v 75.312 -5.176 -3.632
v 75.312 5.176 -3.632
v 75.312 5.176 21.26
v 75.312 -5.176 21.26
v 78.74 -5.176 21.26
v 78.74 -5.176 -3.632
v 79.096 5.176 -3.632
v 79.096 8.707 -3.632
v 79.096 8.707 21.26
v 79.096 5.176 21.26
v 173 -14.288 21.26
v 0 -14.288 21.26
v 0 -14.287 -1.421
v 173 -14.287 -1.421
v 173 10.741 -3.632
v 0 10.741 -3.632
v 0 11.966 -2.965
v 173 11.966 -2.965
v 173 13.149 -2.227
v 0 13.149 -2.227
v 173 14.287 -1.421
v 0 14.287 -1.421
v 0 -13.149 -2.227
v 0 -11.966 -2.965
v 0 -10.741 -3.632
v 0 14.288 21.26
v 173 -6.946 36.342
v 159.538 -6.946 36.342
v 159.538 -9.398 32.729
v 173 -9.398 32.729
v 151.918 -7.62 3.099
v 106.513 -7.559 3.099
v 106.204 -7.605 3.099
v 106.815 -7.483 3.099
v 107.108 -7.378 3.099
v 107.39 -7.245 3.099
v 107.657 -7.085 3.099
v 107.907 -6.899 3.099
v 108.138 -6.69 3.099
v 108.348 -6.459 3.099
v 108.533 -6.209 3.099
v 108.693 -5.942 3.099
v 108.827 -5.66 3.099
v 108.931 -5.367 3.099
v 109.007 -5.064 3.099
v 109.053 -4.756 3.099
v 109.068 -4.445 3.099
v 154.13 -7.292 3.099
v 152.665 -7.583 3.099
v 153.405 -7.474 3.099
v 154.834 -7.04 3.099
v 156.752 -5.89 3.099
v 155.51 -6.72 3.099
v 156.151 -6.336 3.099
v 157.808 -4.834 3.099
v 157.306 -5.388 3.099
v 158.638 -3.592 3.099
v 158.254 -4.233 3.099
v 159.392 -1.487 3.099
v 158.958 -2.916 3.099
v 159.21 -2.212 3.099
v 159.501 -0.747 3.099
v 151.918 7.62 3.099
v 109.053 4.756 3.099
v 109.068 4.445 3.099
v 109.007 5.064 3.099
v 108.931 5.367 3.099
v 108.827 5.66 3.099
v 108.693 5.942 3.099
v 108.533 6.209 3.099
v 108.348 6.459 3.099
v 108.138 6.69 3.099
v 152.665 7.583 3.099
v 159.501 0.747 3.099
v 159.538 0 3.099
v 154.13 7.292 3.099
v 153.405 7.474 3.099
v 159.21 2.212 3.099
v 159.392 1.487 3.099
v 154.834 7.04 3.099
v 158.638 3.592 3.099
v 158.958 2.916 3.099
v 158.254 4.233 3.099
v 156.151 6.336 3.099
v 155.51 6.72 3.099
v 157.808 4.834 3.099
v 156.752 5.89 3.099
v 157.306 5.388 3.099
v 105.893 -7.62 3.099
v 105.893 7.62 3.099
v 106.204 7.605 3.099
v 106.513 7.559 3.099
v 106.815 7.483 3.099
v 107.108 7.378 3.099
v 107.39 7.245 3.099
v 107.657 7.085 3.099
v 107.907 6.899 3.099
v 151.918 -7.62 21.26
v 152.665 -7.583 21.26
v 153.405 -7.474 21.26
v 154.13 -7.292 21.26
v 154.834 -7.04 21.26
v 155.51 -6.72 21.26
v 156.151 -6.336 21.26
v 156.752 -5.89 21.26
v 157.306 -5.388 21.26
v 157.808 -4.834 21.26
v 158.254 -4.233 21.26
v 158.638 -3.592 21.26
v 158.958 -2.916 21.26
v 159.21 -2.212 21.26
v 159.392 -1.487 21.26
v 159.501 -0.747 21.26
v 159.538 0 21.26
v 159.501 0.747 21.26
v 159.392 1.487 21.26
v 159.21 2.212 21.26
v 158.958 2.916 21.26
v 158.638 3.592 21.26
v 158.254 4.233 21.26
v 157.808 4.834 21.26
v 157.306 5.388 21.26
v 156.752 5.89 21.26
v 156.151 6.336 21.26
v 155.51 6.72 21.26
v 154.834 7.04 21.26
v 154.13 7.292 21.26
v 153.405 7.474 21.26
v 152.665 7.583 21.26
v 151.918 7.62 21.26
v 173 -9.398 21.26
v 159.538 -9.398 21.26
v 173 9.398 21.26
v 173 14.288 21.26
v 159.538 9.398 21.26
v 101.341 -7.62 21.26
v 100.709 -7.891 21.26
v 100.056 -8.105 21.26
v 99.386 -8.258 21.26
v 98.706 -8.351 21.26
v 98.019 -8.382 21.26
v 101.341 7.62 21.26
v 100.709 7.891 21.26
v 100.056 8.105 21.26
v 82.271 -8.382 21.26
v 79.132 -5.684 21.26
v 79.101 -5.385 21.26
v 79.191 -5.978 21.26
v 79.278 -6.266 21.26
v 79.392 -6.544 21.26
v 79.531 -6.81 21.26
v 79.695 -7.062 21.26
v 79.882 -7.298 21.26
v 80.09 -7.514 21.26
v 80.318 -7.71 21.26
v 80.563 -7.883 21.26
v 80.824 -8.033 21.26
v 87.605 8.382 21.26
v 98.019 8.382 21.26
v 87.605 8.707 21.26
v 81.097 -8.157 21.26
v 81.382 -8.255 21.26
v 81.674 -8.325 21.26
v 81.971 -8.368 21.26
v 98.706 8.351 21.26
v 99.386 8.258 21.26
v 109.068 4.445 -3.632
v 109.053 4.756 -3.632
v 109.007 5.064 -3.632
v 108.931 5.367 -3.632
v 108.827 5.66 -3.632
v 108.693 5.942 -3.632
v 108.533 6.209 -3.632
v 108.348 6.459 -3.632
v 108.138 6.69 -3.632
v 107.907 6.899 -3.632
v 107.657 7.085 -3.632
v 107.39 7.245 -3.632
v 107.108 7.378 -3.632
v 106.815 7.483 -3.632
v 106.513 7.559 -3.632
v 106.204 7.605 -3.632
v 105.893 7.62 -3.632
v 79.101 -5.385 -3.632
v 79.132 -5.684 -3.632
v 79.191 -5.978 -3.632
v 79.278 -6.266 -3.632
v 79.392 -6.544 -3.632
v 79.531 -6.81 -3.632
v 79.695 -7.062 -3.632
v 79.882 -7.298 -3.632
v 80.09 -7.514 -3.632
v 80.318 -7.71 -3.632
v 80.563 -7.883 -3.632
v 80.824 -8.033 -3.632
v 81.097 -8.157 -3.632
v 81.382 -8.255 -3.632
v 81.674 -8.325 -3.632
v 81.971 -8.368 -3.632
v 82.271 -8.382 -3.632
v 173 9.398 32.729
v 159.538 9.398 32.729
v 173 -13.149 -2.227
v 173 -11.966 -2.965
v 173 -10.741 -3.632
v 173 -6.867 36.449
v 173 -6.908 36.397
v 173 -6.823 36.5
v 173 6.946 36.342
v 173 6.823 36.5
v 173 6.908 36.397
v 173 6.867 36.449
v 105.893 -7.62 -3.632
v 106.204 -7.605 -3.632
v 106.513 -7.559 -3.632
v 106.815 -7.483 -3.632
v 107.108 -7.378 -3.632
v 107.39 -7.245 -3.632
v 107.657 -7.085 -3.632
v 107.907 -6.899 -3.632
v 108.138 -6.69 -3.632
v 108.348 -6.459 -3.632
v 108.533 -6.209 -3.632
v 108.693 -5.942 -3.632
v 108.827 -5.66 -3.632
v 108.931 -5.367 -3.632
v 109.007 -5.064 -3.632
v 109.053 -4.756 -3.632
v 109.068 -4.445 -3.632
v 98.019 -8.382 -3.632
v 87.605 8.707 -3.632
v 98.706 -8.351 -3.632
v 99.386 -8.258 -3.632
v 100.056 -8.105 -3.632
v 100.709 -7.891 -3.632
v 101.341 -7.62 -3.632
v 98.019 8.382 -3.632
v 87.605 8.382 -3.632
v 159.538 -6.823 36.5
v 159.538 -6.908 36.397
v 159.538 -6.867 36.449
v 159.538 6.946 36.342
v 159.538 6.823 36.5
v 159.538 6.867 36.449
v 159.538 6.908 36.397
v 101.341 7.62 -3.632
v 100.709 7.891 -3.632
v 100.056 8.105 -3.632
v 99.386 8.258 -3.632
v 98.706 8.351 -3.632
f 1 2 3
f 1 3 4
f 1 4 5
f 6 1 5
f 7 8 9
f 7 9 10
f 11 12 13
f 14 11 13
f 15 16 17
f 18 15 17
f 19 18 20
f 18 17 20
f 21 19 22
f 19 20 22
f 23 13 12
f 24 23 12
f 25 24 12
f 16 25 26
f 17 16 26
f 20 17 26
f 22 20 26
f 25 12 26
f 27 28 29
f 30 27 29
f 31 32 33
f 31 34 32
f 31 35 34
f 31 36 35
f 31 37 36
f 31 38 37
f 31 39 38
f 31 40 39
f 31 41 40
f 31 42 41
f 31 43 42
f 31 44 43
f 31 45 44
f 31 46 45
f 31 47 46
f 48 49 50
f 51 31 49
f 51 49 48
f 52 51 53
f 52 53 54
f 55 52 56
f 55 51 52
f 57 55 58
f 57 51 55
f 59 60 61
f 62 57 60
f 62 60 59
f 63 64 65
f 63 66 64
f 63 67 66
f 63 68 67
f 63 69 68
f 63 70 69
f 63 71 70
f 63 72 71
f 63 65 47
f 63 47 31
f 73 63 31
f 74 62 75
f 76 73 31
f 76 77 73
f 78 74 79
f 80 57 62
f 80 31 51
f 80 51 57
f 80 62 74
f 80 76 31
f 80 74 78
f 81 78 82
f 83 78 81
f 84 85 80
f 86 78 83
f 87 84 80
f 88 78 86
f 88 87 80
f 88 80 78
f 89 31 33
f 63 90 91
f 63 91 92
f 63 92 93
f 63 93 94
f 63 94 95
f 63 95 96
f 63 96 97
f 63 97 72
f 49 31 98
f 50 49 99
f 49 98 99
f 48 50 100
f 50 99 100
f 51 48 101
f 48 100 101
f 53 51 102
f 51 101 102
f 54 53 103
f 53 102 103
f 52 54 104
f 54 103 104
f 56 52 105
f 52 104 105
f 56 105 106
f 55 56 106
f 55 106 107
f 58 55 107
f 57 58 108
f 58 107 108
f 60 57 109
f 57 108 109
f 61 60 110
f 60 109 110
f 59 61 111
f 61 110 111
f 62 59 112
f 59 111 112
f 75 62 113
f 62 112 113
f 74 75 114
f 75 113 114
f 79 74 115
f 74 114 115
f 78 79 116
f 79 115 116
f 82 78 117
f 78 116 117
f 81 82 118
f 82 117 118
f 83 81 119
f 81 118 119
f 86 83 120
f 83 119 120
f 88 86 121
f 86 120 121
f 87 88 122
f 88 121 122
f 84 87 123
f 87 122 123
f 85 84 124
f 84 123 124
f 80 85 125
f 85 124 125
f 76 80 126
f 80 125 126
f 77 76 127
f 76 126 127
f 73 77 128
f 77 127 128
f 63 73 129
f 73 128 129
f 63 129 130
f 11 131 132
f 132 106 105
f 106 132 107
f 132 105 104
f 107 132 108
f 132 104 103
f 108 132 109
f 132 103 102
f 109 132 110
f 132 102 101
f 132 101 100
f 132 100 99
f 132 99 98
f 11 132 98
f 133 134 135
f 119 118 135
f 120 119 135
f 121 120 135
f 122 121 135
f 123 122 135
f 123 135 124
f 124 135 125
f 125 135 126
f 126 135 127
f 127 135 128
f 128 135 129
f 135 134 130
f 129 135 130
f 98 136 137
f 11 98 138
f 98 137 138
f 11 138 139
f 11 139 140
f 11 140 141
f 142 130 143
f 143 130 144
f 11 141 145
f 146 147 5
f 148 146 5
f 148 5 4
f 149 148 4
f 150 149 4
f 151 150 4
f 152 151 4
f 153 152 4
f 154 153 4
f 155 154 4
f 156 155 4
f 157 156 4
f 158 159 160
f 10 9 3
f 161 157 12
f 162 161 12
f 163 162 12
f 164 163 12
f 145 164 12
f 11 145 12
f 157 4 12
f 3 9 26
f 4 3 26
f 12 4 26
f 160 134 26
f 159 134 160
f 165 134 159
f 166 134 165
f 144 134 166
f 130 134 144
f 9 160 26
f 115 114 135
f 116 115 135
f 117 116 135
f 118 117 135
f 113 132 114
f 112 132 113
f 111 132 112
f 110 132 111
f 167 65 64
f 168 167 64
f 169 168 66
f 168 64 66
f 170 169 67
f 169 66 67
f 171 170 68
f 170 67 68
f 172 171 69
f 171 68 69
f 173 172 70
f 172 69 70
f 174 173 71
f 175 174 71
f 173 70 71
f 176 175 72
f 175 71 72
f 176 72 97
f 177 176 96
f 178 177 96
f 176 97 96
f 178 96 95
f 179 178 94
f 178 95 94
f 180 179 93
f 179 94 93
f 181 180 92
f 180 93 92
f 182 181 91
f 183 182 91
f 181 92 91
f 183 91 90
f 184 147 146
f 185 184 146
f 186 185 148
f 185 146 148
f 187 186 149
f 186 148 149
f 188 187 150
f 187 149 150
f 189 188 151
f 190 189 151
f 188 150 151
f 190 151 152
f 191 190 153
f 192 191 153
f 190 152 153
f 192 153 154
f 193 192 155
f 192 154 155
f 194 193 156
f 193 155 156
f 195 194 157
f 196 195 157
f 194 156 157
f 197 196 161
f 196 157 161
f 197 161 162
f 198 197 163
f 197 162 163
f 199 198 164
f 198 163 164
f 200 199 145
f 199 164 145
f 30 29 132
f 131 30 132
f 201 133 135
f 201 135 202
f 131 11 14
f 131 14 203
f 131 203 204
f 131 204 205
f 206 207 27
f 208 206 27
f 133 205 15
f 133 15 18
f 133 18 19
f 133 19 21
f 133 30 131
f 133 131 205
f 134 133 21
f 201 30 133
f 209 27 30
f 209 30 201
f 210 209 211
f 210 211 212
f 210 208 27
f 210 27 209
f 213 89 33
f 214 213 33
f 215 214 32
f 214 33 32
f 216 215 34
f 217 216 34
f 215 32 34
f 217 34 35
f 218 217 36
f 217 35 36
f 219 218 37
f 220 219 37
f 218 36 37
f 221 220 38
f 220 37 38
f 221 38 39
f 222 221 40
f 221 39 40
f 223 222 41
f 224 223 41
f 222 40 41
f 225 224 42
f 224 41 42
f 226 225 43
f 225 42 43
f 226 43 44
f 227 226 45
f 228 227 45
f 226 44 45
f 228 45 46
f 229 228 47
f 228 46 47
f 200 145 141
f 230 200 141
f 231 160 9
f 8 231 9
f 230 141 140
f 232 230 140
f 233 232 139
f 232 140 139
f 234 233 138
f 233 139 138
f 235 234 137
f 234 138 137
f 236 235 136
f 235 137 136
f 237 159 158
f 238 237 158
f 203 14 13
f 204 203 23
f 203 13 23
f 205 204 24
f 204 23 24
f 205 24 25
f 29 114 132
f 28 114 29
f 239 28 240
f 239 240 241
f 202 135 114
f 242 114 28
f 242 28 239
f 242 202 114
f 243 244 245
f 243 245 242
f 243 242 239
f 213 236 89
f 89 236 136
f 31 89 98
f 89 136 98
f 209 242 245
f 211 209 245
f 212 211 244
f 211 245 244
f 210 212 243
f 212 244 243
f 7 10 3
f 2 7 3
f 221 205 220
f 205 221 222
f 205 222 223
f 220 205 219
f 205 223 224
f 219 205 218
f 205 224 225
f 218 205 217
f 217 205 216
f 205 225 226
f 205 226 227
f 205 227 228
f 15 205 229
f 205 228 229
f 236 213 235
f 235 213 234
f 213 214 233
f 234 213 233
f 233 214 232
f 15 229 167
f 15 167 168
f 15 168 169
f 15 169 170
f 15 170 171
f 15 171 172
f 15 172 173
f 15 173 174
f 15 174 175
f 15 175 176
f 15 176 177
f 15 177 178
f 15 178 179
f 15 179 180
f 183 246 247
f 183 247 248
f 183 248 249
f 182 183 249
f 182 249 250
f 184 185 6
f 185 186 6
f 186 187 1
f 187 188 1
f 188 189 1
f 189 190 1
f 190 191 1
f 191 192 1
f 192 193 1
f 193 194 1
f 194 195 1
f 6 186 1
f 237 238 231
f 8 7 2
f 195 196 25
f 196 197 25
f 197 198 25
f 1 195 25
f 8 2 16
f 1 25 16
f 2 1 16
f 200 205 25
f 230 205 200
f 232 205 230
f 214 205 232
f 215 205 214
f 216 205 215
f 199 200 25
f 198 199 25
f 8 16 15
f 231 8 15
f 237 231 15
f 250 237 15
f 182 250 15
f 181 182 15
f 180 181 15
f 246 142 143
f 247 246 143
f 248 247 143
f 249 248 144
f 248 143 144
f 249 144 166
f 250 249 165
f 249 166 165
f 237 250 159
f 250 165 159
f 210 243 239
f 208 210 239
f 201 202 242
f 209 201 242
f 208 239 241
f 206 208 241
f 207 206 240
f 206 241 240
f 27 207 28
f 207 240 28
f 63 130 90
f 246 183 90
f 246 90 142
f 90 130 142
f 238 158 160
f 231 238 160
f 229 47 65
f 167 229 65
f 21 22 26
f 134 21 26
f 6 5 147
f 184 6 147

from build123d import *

# Parameters (mm, degrees)
F1_DEPTH  = 173
F3_DEPTH  = 173.001
F5_DEPTH  = 173.001
F6_W      = 159.538
F6_H      = 15.24
F7_DEPTH  = 23.6865
F9_DEPTH  = 18.161
F11_DEPTH = 24.893
F13_DEPTH = 24.893


with BuildPart() as f1:
    # F0 (on Right) → F1 (new body)
    with BuildSketch(Plane.YZ):
        with BuildLine():
            ThreePointArc((-16, 0), (0, -6.2), (16, 0))
            Line((16, 0), (16, 22.539117))
            ThreePointArc((16, 22.539117), (15.933845, 22.979673), (15.741214, 23.381369))
            Line((15.741214, 23.381369), (6.946329, 36.342252))
            ThreePointArc((6.946329, 36.342252), (6.407476, 36.825401), (5.705115, 37))
            Line((5.705115, 37), (-5.705115, 37))
            ThreePointArc((-5.705115, 37), (-6.407476, 36.825401), (-6.946329, 36.342252))
            Line((-6.946329, 36.342252), (-15.741214, 23.381369))
            ThreePointArc((-15.741214, 23.381369), (-15.933845, 22.979673), (-16, 22.539117))
            Line((-16, 22.539117), (-16, 0))
        make_face()
    extrude(amount=F1_DEPTH)

    # F2 (on face) → F3 (cut, through all)
    with BuildSketch(Plane(origin=(0, 0, 0), x_dir=(0, -1, 0), z_dir=(-1, 0, 0))):
        Polygon((-16, 21.26), (-9.398, 21.26), (-9.398, 36.5), (9.398, 36.5), (9.398, 21.26), (16, 21.26), (16, 39.197723), (-16, 39.197723), align=None)
    extrude(amount=-F3_DEPTH, mode=Mode.SUBTRACT)

    # F4 (on face) → F5 (cut, through all)
    with BuildSketch(Plane(origin=(0, 0, 0), x_dir=(0, -1, 0), z_dir=(-1, 0, 0))):
        Polygon((-14.2875, 21.26), (-16, 21.26), (-16, -10.530328), (16, -10.530328), (16, 21.26), (14.2875, 21.26), (14.2875, -3.632), (-14.2875, -3.632), align=None)
    extrude(amount=-F5_DEPTH, mode=Mode.SUBTRACT)

    # F6 (on face) → F7 (cut, through all)
    with BuildSketch(Plane(origin=(0, 9.398, 0), x_dir=(-1, 0, 0), z_dir=(0, 1, 0))):
        with Locations((-79.769, 28.88)):
            Rectangle(F6_W, F6_H)
    extrude(amount=-F7_DEPTH, mode=Mode.SUBTRACT)

    # F8 (on face) → F9 (cut)
    with BuildSketch(Plane.XY.offset(21.26)):
        with BuildLine():
            Line((85.9796, -7.62), (151.918, -7.62))
            ThreePointArc((151.918, -7.62), (159.538, 0), (151.918, 7.62))
            Line((151.918, 7.62), (85.9796, 7.62))
            ThreePointArc((85.9796, 7.62), (78.3596, 0), (85.9796, -7.62))
        make_face()
    extrude(amount=-F9_DEPTH, mode=Mode.SUBTRACT)

    # F10 (on face) → F11 (cut, through all)
    with BuildSketch(Plane.XY.offset(21.26)):
        with BuildLine():
            Line((109.0682, -4.445), (109.0682, 4.445))
            ThreePointArc((109.0682, 4.445), (108.138264, 6.690064), (105.8932, 7.62))
            Line((105.8932, 7.62), (101.340681, 7.62))
            ThreePointArc((101.340681, 7.62), (99.723084, 8.189057), (98.0192, 8.382))
            Line((98.0192, 8.382), (79.8582, 8.382))
            Line((79.8582, 8.382), (79.8582, 5))
            Line((79.8582, 5), (75.7942, 5))
            Line((75.7942, 5), (75.7942, -1.642426))
            ThreePointArc((75.7942, -1.642426), (76.219569, -3.229926), (77.3817, -4.392056))
            Line((77.3817, -4.392056), (79.101182, -5.3848))
            ThreePointArc((79.101182, -5.3848), (80.089903, -7.51407), (82.2712, -8.382))
            Line((82.2712, -8.382), (98.0192, -8.382))
            ThreePointArc((98.0192, -8.382), (99.723084, -8.189057), (101.340681, -7.62))
            Line((101.340681, -7.62), (105.8932, -7.62))
            ThreePointArc((105.8932, -7.62), (108.138264, -6.690064), (109.0682, -4.445))
        make_face()
    extrude(amount=-F11_DEPTH, mode=Mode.SUBTRACT)

    # F12 (on face) → F13 (cut, through all)
    with BuildSketch(Plane.XY.offset(21.26)):
        Polygon((75.3116, -5.1765), (87.6052, -5.1765), (87.6052, 8.7071), (79.0962, 8.7071), (79.0962, 5.1765), (75.3116, 5.1765), align=None)
    extrude(amount=-F13_DEPTH, mode=Mode.SUBTRACT)


solid = f1.part
